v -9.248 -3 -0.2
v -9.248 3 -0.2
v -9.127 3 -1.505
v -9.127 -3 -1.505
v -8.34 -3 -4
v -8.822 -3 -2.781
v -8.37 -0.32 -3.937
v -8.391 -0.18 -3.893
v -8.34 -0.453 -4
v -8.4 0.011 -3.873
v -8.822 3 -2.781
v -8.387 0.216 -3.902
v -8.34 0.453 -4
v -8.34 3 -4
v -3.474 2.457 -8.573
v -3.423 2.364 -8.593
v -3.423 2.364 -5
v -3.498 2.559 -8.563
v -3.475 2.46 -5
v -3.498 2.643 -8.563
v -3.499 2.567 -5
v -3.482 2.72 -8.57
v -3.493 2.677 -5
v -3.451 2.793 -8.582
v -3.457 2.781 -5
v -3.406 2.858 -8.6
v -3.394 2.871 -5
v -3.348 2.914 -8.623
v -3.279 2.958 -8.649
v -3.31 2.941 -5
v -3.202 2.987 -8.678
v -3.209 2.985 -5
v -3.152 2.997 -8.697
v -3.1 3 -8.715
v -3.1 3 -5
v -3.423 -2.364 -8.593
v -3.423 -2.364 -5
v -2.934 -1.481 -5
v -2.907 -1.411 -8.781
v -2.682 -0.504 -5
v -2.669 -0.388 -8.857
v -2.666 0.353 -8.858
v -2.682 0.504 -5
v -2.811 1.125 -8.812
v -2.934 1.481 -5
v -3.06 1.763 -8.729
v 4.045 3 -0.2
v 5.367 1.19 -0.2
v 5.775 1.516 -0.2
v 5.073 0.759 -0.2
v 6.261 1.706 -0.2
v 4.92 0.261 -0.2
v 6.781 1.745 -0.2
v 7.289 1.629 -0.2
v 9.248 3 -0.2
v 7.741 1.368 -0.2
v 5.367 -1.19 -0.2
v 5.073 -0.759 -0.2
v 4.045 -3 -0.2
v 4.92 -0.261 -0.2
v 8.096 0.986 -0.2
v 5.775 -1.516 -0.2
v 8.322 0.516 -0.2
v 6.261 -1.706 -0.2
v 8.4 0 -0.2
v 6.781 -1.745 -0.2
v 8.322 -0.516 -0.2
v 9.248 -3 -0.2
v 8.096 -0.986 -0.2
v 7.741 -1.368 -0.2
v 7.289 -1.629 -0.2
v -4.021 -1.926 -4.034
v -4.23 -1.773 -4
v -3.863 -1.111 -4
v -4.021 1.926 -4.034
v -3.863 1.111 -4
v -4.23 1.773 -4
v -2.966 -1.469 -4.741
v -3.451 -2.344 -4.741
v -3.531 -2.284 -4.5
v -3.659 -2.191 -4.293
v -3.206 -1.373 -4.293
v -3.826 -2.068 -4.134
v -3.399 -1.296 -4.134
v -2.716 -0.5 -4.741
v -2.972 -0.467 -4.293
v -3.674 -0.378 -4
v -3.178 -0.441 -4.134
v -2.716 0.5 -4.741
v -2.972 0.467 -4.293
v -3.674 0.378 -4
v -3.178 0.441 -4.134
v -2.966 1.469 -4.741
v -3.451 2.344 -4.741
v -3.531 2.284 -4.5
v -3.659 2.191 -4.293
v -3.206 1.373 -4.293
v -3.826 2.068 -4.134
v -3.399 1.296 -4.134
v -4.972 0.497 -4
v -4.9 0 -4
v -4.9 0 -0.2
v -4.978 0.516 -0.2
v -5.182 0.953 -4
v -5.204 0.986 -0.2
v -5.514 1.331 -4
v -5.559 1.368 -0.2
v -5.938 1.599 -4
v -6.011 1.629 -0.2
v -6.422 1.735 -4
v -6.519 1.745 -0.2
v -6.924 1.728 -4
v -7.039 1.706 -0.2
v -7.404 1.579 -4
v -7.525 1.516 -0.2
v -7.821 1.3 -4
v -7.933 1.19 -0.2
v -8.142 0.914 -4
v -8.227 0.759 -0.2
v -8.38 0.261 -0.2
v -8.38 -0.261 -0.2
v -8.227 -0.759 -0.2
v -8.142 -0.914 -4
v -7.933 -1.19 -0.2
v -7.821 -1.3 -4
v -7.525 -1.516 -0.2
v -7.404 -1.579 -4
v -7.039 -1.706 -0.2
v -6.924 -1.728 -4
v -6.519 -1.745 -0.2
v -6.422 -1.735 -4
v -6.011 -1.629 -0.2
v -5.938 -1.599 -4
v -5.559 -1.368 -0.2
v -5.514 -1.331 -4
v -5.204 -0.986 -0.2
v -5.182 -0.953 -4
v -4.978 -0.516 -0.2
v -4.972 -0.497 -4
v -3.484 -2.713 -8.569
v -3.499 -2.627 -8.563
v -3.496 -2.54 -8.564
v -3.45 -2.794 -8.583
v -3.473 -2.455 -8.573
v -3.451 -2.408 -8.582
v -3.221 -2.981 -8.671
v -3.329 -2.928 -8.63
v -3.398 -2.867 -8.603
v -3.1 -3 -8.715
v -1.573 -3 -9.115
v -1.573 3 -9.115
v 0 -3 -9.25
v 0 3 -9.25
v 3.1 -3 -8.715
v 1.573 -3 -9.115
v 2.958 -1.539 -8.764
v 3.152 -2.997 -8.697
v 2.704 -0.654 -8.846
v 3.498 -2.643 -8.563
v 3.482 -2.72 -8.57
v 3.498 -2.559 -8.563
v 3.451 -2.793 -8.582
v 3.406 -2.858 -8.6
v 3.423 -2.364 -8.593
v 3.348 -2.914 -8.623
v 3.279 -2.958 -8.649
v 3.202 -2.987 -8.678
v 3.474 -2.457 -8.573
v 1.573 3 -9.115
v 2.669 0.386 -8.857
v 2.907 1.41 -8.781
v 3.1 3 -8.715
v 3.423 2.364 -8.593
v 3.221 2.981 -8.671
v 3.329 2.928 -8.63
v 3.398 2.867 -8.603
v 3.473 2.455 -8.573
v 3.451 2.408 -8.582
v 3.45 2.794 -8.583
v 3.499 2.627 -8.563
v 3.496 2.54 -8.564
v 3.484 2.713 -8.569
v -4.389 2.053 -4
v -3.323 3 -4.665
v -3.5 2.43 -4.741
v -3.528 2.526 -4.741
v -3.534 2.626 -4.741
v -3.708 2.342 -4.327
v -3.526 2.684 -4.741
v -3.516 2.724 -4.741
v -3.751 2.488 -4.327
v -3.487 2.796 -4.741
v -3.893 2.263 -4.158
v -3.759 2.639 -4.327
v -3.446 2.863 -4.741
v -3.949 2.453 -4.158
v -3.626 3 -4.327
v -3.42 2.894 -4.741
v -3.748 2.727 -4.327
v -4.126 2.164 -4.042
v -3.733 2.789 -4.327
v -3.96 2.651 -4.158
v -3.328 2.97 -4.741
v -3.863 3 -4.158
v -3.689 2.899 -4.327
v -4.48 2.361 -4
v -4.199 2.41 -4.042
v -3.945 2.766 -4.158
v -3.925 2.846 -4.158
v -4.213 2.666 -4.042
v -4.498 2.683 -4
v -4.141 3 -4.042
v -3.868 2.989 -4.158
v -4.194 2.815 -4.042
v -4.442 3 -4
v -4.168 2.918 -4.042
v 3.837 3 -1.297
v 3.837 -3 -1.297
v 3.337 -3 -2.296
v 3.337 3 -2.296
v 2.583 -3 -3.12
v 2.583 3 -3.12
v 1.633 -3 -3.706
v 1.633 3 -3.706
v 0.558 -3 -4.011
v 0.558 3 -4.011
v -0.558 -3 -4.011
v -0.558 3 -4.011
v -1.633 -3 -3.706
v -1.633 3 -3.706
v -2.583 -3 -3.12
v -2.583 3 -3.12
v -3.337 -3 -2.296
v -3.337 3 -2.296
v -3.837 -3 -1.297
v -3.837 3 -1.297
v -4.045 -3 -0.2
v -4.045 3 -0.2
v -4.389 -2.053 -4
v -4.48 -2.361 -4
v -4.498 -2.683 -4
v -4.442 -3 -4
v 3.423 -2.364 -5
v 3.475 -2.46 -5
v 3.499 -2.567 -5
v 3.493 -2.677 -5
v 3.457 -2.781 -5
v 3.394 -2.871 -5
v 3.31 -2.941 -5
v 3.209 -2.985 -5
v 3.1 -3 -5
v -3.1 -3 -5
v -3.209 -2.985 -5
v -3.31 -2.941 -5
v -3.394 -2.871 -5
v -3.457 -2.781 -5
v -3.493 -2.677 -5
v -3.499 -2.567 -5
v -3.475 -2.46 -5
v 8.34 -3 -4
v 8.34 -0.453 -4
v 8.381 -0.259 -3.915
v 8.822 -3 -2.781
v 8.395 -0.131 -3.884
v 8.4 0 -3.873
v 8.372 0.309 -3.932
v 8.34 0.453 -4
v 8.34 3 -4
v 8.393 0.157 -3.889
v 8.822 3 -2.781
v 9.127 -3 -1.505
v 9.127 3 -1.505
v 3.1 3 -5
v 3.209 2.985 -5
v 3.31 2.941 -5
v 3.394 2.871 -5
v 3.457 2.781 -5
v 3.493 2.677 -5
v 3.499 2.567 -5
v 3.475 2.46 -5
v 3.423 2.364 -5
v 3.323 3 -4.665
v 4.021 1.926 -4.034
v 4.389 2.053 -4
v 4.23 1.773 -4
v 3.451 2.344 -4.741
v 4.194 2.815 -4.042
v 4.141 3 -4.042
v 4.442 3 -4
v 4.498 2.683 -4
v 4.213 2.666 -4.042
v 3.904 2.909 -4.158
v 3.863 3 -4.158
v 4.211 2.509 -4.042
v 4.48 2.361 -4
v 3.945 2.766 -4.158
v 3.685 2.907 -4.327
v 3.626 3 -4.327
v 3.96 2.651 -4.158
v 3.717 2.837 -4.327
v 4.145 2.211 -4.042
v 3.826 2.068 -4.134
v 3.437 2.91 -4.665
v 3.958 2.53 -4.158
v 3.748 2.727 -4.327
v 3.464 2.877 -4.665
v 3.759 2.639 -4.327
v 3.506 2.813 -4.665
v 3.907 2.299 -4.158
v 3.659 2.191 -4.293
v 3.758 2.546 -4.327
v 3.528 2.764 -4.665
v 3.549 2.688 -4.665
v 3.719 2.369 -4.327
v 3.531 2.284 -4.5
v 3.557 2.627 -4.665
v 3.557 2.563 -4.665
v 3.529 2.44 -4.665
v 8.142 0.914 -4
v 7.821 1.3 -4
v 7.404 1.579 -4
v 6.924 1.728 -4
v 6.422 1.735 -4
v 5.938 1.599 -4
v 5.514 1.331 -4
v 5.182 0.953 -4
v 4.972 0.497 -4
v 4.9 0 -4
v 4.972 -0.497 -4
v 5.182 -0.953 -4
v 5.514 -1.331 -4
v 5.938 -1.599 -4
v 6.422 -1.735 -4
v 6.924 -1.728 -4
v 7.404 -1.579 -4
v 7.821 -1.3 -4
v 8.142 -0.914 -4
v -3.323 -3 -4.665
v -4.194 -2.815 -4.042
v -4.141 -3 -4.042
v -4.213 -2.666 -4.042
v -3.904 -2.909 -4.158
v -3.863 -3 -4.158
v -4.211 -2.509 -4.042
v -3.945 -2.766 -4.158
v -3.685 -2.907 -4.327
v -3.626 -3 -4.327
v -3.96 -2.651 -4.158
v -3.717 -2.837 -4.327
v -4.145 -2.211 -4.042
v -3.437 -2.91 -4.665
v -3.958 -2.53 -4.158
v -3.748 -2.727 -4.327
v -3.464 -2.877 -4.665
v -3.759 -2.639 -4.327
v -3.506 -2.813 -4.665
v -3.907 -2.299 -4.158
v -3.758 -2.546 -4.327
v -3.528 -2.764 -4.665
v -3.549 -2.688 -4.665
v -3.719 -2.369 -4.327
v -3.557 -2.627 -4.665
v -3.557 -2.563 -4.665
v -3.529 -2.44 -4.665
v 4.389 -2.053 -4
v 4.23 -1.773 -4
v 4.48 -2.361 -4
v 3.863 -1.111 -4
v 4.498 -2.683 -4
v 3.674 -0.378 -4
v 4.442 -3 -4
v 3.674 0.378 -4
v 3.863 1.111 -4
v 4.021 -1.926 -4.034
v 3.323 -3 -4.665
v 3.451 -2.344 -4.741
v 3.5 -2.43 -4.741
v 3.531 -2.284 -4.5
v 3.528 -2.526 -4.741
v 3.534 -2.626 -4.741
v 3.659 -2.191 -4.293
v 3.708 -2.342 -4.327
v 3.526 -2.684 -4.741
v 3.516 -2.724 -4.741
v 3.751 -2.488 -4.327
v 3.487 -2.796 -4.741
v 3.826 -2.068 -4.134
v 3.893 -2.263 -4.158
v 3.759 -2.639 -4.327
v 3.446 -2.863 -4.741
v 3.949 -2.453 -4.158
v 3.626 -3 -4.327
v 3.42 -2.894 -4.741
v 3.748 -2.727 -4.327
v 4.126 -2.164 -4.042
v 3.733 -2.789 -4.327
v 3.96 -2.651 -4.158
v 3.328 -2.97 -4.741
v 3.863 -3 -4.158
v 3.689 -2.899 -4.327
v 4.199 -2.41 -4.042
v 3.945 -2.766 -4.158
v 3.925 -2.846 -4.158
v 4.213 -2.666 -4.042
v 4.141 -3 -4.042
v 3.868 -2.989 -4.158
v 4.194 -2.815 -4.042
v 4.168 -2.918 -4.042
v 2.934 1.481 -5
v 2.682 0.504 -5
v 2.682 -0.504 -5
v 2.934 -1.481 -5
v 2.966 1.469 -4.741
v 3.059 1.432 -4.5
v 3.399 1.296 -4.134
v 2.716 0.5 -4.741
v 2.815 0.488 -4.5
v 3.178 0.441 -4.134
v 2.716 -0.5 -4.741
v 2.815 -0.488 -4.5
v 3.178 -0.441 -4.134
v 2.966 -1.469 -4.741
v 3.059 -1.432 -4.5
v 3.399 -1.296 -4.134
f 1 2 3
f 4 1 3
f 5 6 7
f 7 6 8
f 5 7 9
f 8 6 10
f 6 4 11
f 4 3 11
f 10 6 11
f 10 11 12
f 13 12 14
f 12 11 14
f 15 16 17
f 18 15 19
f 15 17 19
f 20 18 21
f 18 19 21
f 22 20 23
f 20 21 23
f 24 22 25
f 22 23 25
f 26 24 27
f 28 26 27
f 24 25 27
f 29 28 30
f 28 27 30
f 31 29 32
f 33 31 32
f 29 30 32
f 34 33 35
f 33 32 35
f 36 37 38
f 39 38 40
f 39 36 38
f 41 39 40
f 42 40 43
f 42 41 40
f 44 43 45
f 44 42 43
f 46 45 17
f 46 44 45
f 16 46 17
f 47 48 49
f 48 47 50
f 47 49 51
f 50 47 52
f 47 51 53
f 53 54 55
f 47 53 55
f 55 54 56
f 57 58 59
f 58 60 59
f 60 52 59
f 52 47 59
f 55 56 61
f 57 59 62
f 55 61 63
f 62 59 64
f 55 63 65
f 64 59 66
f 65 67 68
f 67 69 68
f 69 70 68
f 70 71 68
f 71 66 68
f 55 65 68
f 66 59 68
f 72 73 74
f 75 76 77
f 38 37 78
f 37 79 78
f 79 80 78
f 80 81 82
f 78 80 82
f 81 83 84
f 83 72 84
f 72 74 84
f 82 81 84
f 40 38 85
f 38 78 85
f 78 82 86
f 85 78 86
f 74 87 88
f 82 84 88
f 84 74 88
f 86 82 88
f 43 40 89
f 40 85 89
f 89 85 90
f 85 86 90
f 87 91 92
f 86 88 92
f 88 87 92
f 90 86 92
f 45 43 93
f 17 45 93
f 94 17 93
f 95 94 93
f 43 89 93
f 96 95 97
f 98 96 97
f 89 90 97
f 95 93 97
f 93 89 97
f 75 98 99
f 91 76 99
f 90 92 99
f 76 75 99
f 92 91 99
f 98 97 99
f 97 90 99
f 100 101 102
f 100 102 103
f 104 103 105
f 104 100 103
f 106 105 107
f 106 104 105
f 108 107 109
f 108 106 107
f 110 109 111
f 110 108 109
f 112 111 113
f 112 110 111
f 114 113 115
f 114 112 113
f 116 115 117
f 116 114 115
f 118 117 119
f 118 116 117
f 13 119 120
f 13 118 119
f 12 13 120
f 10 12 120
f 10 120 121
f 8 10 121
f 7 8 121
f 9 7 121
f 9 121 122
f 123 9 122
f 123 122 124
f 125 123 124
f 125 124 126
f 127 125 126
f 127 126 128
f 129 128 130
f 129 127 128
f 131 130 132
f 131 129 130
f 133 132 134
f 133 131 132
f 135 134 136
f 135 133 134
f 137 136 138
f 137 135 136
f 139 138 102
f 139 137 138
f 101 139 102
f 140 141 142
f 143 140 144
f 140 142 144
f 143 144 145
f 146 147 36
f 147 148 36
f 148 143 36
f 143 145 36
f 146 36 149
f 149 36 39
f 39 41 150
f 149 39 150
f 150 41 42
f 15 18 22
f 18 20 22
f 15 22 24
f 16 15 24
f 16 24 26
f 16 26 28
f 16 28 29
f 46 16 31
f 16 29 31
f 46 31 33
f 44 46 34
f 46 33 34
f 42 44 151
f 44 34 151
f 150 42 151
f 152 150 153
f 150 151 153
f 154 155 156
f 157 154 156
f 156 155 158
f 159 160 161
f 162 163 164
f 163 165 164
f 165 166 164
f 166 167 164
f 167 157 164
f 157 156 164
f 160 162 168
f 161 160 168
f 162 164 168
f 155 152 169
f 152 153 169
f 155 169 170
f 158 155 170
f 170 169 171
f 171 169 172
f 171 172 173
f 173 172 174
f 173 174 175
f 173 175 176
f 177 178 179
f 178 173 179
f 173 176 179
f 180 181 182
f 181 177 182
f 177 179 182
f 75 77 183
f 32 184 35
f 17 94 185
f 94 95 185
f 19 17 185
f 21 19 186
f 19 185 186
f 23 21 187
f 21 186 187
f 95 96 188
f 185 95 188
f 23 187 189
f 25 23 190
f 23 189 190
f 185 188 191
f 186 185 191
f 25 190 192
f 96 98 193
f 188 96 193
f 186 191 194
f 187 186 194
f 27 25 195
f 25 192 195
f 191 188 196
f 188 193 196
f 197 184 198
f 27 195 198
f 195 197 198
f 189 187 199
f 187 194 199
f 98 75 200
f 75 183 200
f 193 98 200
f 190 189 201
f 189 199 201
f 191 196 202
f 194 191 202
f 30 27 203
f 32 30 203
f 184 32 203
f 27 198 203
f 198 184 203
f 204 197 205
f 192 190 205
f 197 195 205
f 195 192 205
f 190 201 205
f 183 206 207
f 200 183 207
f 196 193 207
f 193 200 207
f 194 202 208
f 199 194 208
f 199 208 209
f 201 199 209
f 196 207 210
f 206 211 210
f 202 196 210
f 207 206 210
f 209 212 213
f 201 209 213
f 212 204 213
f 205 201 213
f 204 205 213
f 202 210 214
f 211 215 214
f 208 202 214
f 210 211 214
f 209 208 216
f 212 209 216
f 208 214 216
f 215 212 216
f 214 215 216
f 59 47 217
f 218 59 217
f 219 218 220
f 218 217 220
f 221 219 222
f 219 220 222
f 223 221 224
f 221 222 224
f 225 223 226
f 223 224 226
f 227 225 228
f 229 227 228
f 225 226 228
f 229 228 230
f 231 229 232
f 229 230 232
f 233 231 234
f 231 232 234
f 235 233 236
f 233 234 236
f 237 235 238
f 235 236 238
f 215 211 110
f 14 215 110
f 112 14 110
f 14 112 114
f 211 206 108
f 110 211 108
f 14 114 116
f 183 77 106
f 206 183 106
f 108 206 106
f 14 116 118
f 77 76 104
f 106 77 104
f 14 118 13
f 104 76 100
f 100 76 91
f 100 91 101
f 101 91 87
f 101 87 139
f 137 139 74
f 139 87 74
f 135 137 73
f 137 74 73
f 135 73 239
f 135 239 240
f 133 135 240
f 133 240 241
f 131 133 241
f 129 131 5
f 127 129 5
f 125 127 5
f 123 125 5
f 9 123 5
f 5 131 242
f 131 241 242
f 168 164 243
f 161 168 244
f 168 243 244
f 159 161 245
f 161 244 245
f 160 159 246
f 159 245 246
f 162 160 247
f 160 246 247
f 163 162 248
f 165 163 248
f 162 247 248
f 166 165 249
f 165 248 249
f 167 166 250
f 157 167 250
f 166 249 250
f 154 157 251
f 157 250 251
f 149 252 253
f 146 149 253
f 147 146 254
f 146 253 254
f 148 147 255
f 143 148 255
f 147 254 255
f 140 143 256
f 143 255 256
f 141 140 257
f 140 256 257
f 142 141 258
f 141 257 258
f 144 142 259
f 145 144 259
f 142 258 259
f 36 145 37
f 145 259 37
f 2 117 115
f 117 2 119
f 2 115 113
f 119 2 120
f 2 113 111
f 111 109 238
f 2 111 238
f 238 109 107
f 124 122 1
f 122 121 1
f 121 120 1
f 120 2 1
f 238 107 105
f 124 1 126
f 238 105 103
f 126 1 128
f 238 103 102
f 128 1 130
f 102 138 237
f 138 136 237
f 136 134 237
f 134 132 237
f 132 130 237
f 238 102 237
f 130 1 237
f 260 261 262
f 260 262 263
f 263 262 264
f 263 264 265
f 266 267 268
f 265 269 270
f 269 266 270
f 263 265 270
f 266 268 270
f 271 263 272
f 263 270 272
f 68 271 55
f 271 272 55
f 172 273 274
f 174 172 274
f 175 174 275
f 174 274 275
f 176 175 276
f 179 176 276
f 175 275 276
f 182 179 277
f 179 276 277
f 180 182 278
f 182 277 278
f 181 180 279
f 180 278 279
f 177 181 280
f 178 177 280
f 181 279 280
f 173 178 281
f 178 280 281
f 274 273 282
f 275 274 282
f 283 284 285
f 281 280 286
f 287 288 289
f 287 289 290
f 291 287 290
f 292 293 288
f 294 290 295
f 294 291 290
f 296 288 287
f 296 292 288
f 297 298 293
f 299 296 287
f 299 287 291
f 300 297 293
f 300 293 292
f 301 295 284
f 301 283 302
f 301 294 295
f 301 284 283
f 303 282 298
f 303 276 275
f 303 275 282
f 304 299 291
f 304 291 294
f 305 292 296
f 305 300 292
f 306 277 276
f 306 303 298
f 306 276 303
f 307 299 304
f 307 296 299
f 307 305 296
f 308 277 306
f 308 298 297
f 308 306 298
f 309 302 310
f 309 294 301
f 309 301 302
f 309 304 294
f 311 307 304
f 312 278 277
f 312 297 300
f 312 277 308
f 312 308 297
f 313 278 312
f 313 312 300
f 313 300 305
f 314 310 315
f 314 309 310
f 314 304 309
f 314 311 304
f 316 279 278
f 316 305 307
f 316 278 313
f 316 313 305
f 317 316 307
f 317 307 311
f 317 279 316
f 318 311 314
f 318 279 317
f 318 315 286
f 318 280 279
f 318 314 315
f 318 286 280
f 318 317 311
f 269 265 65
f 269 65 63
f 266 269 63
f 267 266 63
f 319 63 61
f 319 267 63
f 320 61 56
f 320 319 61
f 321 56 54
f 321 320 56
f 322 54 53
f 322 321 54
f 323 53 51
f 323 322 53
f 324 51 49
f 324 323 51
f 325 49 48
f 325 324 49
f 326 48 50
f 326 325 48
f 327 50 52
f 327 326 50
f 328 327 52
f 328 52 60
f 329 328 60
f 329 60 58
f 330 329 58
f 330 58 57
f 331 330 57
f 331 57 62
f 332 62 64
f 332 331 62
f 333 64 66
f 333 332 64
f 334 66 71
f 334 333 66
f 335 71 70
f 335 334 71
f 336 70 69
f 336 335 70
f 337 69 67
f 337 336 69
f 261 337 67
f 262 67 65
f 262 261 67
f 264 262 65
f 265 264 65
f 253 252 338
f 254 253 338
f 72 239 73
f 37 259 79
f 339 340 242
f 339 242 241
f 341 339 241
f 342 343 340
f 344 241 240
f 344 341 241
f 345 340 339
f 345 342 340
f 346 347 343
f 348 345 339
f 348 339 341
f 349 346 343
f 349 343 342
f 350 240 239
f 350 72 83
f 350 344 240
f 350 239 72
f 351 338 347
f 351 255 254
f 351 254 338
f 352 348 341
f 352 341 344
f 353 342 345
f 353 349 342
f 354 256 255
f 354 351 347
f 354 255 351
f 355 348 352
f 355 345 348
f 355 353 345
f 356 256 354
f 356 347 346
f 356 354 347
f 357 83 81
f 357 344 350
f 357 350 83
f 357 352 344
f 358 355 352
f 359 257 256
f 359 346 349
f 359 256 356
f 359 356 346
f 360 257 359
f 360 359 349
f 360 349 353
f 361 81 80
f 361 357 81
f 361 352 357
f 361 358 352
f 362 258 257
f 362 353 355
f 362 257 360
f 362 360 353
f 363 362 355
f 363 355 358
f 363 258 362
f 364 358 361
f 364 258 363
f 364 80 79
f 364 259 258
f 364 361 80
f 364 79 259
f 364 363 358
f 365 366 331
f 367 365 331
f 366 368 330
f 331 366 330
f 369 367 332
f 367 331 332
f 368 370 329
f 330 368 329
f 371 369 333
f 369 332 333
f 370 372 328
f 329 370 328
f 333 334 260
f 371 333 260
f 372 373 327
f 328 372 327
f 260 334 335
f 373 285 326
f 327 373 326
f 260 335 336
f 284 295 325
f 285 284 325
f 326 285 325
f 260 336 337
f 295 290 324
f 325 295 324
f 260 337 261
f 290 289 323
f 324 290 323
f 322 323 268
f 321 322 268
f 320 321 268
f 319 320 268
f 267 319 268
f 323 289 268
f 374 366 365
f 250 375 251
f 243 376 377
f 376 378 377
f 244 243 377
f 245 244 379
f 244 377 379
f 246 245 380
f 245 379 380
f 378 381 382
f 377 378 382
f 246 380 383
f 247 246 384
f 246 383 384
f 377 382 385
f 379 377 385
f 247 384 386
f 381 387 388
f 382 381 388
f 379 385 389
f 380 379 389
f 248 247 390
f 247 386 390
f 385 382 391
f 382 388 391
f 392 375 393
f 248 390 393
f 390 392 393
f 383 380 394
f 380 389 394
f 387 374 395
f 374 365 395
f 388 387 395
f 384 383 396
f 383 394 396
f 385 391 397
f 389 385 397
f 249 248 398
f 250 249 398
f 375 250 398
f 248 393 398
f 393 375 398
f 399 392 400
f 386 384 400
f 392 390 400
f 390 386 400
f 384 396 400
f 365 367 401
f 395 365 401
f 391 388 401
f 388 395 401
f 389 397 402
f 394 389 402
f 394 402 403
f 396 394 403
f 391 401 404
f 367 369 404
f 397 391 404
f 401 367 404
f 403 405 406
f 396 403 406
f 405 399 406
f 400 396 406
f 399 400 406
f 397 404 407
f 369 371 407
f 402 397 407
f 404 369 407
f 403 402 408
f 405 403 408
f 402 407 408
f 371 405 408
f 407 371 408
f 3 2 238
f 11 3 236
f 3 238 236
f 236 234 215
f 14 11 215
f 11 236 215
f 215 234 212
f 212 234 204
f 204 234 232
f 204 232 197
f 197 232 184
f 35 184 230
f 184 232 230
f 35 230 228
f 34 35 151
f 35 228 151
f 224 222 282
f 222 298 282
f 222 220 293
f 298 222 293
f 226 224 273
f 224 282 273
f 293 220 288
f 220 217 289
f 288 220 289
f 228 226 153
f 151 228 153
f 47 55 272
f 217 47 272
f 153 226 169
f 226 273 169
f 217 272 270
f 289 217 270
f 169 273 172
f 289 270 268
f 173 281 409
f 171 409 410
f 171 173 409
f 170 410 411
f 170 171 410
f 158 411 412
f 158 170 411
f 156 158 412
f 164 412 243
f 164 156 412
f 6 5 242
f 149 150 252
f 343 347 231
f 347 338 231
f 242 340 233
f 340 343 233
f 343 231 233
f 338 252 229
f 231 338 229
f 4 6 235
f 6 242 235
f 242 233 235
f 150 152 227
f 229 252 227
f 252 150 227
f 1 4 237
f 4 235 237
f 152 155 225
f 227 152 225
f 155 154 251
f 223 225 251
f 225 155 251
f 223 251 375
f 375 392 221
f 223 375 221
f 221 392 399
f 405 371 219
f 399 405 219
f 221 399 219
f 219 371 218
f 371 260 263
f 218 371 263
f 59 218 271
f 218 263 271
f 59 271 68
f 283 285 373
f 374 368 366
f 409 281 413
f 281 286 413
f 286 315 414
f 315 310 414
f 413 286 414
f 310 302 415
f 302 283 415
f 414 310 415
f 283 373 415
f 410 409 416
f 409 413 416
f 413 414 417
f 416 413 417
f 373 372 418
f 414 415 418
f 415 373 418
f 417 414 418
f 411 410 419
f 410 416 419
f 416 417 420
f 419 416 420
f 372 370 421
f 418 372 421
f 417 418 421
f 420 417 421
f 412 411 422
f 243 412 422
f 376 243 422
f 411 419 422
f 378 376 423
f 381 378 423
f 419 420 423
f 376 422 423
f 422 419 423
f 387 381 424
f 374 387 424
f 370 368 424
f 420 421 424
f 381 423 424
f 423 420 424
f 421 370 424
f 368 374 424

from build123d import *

# Parameters (mm, degrees)
BOSS_EXTRUDE1_DEPTH     = 3
CUT_EXTRUDE1_DEPTH      = 14.421065531
CUT_EXTRUDE1_DEPTH_BACK = 14.421065531
SKETCH2_R               = 1.75
SKETCH3_R               = 4
CUT_EXTRUDE2_DEPTH      = 6
FILLET1_R               = 0.4
FILLET2_R               = 1
CUT_EXTRUDE3_DEPTH      = 15.391838135
CUT_EXTRUDE3_DEPTH_BACK = 15.391838135
SKETCH4_W               = 19
SKETCH4_H               = 0.4


with BuildPart() as part:
    # Sketch1 → Boss-Extrude1 (new, symmetric)
    with BuildSketch(Plane(origin=(0, 0, 0), x_dir=(1, 0, 0), z_dir=(0, 1, 0))):
        with BuildLine():
            Line((-4.05, 0), (-9.25, 0))
            ThreePointArc((-9.25, 0), (0, 9.25), (9.25, 0))
            Line((9.25, 0), (4.05, 0))
            ThreePointArc((4.05, 0), (0, 4.05), (-4.05, 0))
        make_face()
    extrude(amount=BOSS_EXTRUDE1_DEPTH, both=True)

    # Sketch2 → Cut-Extrude1 (cut, two sides: drawn at the far end of the back side and taken through both)
    with BuildSketch(Plane.XY.offset(-CUT_EXTRUDE1_DEPTH_BACK)):
        with Locations((6.65, 0)):
            Circle(SKETCH2_R)
        with Locations((-6.65, 0)):
            Circle(SKETCH2_R)
    extrude(amount=CUT_EXTRUDE1_DEPTH + CUT_EXTRUDE1_DEPTH_BACK, mode=Mode.SUBTRACT)

    # Sketch3 → Cut-Extrude2 (cut)
    with BuildSketch(Plane.XY.offset(-10)):
        with Locations((6.65, 0)):
            Circle(SKETCH3_R)
        with Locations((-6.65, 0)):
            Circle(SKETCH3_R)
    extrude(amount=CUT_EXTRUDE2_DEPTH, mode=Mode.SUBTRACT)

    # Fillet1
    # the kernel refuses this fillet: 0.4 mm, written as the material it takes off along each edge
    with BuildSketch(Plane(origin=(-4.004248689, 3, -4), x_dir=(0.6743792283231849, -0.7383851680567708, 0), z_dir=(0, 0, -1)), Plane(origin=(4.004248689, -3, -4), x_dir=(-0.6743792283231826, 0.7383851680567729, 0), z_dir=(0, 0, -1))) as fillet1_piece_1:
        with BuildLine():
            CenterArc((0.904923131, -0.397672121), FILLET1_R, 96.184415635, 126.22154662)
            Line((0.609569064, -0.667423812), (0, 0))
            ThreePointArc((0, 0), (0.430915777, -0.023278789), (0.861831553, 0))
        make_face()
    extrude(amount=6.598116085, mode=Mode.SUBTRACT)
    with BuildSketch(Plane(origin=(-4.004248689, -3, -4), x_dir=(0.6743792283231809, 0.7383851680567743, 0), z_dir=(0, 0, -1)), Plane(origin=(4.004248689, 3, -4), x_dir=(-0.6743792283231826, -0.7383851680567729, 0), z_dir=(0, 0, -1))) as fillet1_piece_2:
        with BuildLine():
            CenterArc((0.904923131, 0.397672121), FILLET1_R, 137.594037745, 126.22154662)
            Line((0.609569064, 0.667423812), (0, 0))
            ThreePointArc((0, 0), (0.430915777, 0.023278789), (0.861831553, 0))
        make_face()
    extrude(amount=6.598116085, mode=Mode.SUBTRACT)

    # Fillet2
    # the kernel refuses this fillet: 1 mm, written as the material it adds along each edge
    with BuildSketch(Plane(origin=(-6.65, 0, -4), x_dir=(0.8067381522408935, -0.5909090909090408, 0), z_dir=(-0.5909090909090408, -0.8067381522408935, 0))) as fillet2_piece_1:
        with BuildLine():
            CenterArc((4 - FILLET2_R, -FILLET2_R), FILLET2_R, 0, 90)
            Line((4, -FILLET2_R), (4, 0))
            Line((4, 0), (4 - FILLET2_R, 0))
        make_face()
    revolve(axis=Axis((-6.65, 0, -4), (0, 0, 1)), revolution_arc=72.44309324)
    with BuildSketch(Plane(origin=(6.65, 0, -4), x_dir=(-0.8067381522408924, 0.5909090909090423, 0), z_dir=(0.5909090909090423, 0.8067381522408924, 0))) as fillet2_piece_2:
        with BuildLine():
            CenterArc((4 - FILLET2_R, -FILLET2_R), FILLET2_R, 0, 90)
            Line((4, -FILLET2_R), (4, 0))
            Line((4, 0), (4 - FILLET2_R, 0))
        make_face()
    revolve(axis=Axis((6.65, 0, -4), (0, 0, 1)), revolution_arc=72.44309324)
    with BuildSketch(Plane(origin=(-3.10035213, 2.6, -4), x_dir=(-0.8067381522410291, -0.5909090909088556, 0), z_dir=(0.5909090909088556, -0.8067381522410291, 0))) as fillet2_piece_3_section:
        with BuildLine():
            CenterArc((0.4 + FILLET2_R, FILLET2_R), FILLET2_R, 180, 90)
            Line((0.4, FILLET2_R), (0.4, 0))
            Line((0.4, 0), (0.4 + FILLET2_R, 0))
        make_face()
    fillet2_piece_3 = revolve(axis=Axis((-3.10035213, 2.6, -4), (0, 0, -1)), revolution_arc=359.64, mode=Mode.PRIVATE)
    fillet2_piece_3 = split(fillet2_piece_3, bisect_by=Plane(origin=(-3.794786047, 3, -4.154806291), z_dir=(0, -1, 0)), keep=Keep.TOP, mode=Mode.PRIVATE)
    add(fillet2_piece_3)
    with BuildSketch(Plane(origin=(-3.10035213, -2.6, -4), x_dir=(-0.8030094610318433, 0.5959662788223411, 0), z_dir=(-0.5959662788223411, -0.8030094610318433, 0))) as fillet2_piece_4_section:
        with BuildLine():
            CenterArc((-0.4 - FILLET2_R, FILLET2_R), FILLET2_R, 270, 90)
            Line((-0.4 - FILLET2_R, 0), (-0.4, 0))
            Line((-0.4, 0), (-0.4, FILLET2_R))
        make_face()
    fillet2_piece_4 = revolve(axis=Axis((-3.10035213, -2.6, -4), (0, 0, -1)), revolution_arc=359.64, mode=Mode.PRIVATE)
    fillet2_piece_4 = split(fillet2_piece_4, bisect_by=Plane(origin=(-3.549155049, -3, -4.290205519), z_dir=(0, 1, 0)), keep=Keep.TOP, mode=Mode.PRIVATE)
    add(fillet2_piece_4)
    with BuildSketch(Plane(origin=(3.10035213, -2.6, -4), x_dir=(0.8067381522410291, 0.5909090909088556, 0), z_dir=(-0.5909090909088556, 0.8067381522410291, 0))) as fillet2_piece_5_section:
        with BuildLine():
            CenterArc((0.4 + FILLET2_R, FILLET2_R), FILLET2_R, 180, 90)
            Line((0.4, FILLET2_R), (0.4, 0))
            Line((0.4, 0), (0.4 + FILLET2_R, 0))
        make_face()
    fillet2_piece_5 = revolve(axis=Axis((3.10035213, -2.6, -4), (0, 0, -1)), revolution_arc=359.64, mode=Mode.PRIVATE)
    fillet2_piece_5 = split(fillet2_piece_5, bisect_by=Plane(origin=(3.794786054, -3, -4.154806275), z_dir=(0, 1, 0)), keep=Keep.TOP, mode=Mode.PRIVATE)
    add(fillet2_piece_5)
    with BuildSketch(Plane(origin=(3.10035213, 2.6, -4), x_dir=(0.8030094610318433, -0.5959662788223411, 0), z_dir=(0.5959662788223411, 0.8030094610318433, 0))) as fillet2_piece_6_section:
        with BuildLine():
            CenterArc((-0.4 - FILLET2_R, FILLET2_R), FILLET2_R, 270, 90)
            Line((-0.4, FILLET2_R), (-0.4, 0))
            Line((-0.4, 0), (-0.4 - FILLET2_R, 0))
        make_face()
    fillet2_piece_6 = revolve(axis=Axis((3.10035213, 2.6, -4), (0, 0, -1)), revolution_arc=359.64, mode=Mode.PRIVATE)
    fillet2_piece_6 = split(fillet2_piece_6, bisect_by=Plane(origin=(3.549155046, 3, -4.290205778), z_dir=(0, -1, 0)), keep=Keep.TOP, mode=Mode.PRIVATE)
    add(fillet2_piece_6)

    # Sketch4 → Cut-Extrude3 (cut, two sides: drawn at the far end of the back side and taken through both)
    with BuildSketch(Plane(origin=(0, 3, 0), x_dir=(1, 0, 0), z_dir=(0, 1, 0)).offset(-CUT_EXTRUDE3_DEPTH_BACK)):
        Rectangle(SKETCH4_W, SKETCH4_H)
    extrude(amount=CUT_EXTRUDE3_DEPTH + CUT_EXTRUDE3_DEPTH_BACK, mode=Mode.SUBTRACT)


solid = part.part
